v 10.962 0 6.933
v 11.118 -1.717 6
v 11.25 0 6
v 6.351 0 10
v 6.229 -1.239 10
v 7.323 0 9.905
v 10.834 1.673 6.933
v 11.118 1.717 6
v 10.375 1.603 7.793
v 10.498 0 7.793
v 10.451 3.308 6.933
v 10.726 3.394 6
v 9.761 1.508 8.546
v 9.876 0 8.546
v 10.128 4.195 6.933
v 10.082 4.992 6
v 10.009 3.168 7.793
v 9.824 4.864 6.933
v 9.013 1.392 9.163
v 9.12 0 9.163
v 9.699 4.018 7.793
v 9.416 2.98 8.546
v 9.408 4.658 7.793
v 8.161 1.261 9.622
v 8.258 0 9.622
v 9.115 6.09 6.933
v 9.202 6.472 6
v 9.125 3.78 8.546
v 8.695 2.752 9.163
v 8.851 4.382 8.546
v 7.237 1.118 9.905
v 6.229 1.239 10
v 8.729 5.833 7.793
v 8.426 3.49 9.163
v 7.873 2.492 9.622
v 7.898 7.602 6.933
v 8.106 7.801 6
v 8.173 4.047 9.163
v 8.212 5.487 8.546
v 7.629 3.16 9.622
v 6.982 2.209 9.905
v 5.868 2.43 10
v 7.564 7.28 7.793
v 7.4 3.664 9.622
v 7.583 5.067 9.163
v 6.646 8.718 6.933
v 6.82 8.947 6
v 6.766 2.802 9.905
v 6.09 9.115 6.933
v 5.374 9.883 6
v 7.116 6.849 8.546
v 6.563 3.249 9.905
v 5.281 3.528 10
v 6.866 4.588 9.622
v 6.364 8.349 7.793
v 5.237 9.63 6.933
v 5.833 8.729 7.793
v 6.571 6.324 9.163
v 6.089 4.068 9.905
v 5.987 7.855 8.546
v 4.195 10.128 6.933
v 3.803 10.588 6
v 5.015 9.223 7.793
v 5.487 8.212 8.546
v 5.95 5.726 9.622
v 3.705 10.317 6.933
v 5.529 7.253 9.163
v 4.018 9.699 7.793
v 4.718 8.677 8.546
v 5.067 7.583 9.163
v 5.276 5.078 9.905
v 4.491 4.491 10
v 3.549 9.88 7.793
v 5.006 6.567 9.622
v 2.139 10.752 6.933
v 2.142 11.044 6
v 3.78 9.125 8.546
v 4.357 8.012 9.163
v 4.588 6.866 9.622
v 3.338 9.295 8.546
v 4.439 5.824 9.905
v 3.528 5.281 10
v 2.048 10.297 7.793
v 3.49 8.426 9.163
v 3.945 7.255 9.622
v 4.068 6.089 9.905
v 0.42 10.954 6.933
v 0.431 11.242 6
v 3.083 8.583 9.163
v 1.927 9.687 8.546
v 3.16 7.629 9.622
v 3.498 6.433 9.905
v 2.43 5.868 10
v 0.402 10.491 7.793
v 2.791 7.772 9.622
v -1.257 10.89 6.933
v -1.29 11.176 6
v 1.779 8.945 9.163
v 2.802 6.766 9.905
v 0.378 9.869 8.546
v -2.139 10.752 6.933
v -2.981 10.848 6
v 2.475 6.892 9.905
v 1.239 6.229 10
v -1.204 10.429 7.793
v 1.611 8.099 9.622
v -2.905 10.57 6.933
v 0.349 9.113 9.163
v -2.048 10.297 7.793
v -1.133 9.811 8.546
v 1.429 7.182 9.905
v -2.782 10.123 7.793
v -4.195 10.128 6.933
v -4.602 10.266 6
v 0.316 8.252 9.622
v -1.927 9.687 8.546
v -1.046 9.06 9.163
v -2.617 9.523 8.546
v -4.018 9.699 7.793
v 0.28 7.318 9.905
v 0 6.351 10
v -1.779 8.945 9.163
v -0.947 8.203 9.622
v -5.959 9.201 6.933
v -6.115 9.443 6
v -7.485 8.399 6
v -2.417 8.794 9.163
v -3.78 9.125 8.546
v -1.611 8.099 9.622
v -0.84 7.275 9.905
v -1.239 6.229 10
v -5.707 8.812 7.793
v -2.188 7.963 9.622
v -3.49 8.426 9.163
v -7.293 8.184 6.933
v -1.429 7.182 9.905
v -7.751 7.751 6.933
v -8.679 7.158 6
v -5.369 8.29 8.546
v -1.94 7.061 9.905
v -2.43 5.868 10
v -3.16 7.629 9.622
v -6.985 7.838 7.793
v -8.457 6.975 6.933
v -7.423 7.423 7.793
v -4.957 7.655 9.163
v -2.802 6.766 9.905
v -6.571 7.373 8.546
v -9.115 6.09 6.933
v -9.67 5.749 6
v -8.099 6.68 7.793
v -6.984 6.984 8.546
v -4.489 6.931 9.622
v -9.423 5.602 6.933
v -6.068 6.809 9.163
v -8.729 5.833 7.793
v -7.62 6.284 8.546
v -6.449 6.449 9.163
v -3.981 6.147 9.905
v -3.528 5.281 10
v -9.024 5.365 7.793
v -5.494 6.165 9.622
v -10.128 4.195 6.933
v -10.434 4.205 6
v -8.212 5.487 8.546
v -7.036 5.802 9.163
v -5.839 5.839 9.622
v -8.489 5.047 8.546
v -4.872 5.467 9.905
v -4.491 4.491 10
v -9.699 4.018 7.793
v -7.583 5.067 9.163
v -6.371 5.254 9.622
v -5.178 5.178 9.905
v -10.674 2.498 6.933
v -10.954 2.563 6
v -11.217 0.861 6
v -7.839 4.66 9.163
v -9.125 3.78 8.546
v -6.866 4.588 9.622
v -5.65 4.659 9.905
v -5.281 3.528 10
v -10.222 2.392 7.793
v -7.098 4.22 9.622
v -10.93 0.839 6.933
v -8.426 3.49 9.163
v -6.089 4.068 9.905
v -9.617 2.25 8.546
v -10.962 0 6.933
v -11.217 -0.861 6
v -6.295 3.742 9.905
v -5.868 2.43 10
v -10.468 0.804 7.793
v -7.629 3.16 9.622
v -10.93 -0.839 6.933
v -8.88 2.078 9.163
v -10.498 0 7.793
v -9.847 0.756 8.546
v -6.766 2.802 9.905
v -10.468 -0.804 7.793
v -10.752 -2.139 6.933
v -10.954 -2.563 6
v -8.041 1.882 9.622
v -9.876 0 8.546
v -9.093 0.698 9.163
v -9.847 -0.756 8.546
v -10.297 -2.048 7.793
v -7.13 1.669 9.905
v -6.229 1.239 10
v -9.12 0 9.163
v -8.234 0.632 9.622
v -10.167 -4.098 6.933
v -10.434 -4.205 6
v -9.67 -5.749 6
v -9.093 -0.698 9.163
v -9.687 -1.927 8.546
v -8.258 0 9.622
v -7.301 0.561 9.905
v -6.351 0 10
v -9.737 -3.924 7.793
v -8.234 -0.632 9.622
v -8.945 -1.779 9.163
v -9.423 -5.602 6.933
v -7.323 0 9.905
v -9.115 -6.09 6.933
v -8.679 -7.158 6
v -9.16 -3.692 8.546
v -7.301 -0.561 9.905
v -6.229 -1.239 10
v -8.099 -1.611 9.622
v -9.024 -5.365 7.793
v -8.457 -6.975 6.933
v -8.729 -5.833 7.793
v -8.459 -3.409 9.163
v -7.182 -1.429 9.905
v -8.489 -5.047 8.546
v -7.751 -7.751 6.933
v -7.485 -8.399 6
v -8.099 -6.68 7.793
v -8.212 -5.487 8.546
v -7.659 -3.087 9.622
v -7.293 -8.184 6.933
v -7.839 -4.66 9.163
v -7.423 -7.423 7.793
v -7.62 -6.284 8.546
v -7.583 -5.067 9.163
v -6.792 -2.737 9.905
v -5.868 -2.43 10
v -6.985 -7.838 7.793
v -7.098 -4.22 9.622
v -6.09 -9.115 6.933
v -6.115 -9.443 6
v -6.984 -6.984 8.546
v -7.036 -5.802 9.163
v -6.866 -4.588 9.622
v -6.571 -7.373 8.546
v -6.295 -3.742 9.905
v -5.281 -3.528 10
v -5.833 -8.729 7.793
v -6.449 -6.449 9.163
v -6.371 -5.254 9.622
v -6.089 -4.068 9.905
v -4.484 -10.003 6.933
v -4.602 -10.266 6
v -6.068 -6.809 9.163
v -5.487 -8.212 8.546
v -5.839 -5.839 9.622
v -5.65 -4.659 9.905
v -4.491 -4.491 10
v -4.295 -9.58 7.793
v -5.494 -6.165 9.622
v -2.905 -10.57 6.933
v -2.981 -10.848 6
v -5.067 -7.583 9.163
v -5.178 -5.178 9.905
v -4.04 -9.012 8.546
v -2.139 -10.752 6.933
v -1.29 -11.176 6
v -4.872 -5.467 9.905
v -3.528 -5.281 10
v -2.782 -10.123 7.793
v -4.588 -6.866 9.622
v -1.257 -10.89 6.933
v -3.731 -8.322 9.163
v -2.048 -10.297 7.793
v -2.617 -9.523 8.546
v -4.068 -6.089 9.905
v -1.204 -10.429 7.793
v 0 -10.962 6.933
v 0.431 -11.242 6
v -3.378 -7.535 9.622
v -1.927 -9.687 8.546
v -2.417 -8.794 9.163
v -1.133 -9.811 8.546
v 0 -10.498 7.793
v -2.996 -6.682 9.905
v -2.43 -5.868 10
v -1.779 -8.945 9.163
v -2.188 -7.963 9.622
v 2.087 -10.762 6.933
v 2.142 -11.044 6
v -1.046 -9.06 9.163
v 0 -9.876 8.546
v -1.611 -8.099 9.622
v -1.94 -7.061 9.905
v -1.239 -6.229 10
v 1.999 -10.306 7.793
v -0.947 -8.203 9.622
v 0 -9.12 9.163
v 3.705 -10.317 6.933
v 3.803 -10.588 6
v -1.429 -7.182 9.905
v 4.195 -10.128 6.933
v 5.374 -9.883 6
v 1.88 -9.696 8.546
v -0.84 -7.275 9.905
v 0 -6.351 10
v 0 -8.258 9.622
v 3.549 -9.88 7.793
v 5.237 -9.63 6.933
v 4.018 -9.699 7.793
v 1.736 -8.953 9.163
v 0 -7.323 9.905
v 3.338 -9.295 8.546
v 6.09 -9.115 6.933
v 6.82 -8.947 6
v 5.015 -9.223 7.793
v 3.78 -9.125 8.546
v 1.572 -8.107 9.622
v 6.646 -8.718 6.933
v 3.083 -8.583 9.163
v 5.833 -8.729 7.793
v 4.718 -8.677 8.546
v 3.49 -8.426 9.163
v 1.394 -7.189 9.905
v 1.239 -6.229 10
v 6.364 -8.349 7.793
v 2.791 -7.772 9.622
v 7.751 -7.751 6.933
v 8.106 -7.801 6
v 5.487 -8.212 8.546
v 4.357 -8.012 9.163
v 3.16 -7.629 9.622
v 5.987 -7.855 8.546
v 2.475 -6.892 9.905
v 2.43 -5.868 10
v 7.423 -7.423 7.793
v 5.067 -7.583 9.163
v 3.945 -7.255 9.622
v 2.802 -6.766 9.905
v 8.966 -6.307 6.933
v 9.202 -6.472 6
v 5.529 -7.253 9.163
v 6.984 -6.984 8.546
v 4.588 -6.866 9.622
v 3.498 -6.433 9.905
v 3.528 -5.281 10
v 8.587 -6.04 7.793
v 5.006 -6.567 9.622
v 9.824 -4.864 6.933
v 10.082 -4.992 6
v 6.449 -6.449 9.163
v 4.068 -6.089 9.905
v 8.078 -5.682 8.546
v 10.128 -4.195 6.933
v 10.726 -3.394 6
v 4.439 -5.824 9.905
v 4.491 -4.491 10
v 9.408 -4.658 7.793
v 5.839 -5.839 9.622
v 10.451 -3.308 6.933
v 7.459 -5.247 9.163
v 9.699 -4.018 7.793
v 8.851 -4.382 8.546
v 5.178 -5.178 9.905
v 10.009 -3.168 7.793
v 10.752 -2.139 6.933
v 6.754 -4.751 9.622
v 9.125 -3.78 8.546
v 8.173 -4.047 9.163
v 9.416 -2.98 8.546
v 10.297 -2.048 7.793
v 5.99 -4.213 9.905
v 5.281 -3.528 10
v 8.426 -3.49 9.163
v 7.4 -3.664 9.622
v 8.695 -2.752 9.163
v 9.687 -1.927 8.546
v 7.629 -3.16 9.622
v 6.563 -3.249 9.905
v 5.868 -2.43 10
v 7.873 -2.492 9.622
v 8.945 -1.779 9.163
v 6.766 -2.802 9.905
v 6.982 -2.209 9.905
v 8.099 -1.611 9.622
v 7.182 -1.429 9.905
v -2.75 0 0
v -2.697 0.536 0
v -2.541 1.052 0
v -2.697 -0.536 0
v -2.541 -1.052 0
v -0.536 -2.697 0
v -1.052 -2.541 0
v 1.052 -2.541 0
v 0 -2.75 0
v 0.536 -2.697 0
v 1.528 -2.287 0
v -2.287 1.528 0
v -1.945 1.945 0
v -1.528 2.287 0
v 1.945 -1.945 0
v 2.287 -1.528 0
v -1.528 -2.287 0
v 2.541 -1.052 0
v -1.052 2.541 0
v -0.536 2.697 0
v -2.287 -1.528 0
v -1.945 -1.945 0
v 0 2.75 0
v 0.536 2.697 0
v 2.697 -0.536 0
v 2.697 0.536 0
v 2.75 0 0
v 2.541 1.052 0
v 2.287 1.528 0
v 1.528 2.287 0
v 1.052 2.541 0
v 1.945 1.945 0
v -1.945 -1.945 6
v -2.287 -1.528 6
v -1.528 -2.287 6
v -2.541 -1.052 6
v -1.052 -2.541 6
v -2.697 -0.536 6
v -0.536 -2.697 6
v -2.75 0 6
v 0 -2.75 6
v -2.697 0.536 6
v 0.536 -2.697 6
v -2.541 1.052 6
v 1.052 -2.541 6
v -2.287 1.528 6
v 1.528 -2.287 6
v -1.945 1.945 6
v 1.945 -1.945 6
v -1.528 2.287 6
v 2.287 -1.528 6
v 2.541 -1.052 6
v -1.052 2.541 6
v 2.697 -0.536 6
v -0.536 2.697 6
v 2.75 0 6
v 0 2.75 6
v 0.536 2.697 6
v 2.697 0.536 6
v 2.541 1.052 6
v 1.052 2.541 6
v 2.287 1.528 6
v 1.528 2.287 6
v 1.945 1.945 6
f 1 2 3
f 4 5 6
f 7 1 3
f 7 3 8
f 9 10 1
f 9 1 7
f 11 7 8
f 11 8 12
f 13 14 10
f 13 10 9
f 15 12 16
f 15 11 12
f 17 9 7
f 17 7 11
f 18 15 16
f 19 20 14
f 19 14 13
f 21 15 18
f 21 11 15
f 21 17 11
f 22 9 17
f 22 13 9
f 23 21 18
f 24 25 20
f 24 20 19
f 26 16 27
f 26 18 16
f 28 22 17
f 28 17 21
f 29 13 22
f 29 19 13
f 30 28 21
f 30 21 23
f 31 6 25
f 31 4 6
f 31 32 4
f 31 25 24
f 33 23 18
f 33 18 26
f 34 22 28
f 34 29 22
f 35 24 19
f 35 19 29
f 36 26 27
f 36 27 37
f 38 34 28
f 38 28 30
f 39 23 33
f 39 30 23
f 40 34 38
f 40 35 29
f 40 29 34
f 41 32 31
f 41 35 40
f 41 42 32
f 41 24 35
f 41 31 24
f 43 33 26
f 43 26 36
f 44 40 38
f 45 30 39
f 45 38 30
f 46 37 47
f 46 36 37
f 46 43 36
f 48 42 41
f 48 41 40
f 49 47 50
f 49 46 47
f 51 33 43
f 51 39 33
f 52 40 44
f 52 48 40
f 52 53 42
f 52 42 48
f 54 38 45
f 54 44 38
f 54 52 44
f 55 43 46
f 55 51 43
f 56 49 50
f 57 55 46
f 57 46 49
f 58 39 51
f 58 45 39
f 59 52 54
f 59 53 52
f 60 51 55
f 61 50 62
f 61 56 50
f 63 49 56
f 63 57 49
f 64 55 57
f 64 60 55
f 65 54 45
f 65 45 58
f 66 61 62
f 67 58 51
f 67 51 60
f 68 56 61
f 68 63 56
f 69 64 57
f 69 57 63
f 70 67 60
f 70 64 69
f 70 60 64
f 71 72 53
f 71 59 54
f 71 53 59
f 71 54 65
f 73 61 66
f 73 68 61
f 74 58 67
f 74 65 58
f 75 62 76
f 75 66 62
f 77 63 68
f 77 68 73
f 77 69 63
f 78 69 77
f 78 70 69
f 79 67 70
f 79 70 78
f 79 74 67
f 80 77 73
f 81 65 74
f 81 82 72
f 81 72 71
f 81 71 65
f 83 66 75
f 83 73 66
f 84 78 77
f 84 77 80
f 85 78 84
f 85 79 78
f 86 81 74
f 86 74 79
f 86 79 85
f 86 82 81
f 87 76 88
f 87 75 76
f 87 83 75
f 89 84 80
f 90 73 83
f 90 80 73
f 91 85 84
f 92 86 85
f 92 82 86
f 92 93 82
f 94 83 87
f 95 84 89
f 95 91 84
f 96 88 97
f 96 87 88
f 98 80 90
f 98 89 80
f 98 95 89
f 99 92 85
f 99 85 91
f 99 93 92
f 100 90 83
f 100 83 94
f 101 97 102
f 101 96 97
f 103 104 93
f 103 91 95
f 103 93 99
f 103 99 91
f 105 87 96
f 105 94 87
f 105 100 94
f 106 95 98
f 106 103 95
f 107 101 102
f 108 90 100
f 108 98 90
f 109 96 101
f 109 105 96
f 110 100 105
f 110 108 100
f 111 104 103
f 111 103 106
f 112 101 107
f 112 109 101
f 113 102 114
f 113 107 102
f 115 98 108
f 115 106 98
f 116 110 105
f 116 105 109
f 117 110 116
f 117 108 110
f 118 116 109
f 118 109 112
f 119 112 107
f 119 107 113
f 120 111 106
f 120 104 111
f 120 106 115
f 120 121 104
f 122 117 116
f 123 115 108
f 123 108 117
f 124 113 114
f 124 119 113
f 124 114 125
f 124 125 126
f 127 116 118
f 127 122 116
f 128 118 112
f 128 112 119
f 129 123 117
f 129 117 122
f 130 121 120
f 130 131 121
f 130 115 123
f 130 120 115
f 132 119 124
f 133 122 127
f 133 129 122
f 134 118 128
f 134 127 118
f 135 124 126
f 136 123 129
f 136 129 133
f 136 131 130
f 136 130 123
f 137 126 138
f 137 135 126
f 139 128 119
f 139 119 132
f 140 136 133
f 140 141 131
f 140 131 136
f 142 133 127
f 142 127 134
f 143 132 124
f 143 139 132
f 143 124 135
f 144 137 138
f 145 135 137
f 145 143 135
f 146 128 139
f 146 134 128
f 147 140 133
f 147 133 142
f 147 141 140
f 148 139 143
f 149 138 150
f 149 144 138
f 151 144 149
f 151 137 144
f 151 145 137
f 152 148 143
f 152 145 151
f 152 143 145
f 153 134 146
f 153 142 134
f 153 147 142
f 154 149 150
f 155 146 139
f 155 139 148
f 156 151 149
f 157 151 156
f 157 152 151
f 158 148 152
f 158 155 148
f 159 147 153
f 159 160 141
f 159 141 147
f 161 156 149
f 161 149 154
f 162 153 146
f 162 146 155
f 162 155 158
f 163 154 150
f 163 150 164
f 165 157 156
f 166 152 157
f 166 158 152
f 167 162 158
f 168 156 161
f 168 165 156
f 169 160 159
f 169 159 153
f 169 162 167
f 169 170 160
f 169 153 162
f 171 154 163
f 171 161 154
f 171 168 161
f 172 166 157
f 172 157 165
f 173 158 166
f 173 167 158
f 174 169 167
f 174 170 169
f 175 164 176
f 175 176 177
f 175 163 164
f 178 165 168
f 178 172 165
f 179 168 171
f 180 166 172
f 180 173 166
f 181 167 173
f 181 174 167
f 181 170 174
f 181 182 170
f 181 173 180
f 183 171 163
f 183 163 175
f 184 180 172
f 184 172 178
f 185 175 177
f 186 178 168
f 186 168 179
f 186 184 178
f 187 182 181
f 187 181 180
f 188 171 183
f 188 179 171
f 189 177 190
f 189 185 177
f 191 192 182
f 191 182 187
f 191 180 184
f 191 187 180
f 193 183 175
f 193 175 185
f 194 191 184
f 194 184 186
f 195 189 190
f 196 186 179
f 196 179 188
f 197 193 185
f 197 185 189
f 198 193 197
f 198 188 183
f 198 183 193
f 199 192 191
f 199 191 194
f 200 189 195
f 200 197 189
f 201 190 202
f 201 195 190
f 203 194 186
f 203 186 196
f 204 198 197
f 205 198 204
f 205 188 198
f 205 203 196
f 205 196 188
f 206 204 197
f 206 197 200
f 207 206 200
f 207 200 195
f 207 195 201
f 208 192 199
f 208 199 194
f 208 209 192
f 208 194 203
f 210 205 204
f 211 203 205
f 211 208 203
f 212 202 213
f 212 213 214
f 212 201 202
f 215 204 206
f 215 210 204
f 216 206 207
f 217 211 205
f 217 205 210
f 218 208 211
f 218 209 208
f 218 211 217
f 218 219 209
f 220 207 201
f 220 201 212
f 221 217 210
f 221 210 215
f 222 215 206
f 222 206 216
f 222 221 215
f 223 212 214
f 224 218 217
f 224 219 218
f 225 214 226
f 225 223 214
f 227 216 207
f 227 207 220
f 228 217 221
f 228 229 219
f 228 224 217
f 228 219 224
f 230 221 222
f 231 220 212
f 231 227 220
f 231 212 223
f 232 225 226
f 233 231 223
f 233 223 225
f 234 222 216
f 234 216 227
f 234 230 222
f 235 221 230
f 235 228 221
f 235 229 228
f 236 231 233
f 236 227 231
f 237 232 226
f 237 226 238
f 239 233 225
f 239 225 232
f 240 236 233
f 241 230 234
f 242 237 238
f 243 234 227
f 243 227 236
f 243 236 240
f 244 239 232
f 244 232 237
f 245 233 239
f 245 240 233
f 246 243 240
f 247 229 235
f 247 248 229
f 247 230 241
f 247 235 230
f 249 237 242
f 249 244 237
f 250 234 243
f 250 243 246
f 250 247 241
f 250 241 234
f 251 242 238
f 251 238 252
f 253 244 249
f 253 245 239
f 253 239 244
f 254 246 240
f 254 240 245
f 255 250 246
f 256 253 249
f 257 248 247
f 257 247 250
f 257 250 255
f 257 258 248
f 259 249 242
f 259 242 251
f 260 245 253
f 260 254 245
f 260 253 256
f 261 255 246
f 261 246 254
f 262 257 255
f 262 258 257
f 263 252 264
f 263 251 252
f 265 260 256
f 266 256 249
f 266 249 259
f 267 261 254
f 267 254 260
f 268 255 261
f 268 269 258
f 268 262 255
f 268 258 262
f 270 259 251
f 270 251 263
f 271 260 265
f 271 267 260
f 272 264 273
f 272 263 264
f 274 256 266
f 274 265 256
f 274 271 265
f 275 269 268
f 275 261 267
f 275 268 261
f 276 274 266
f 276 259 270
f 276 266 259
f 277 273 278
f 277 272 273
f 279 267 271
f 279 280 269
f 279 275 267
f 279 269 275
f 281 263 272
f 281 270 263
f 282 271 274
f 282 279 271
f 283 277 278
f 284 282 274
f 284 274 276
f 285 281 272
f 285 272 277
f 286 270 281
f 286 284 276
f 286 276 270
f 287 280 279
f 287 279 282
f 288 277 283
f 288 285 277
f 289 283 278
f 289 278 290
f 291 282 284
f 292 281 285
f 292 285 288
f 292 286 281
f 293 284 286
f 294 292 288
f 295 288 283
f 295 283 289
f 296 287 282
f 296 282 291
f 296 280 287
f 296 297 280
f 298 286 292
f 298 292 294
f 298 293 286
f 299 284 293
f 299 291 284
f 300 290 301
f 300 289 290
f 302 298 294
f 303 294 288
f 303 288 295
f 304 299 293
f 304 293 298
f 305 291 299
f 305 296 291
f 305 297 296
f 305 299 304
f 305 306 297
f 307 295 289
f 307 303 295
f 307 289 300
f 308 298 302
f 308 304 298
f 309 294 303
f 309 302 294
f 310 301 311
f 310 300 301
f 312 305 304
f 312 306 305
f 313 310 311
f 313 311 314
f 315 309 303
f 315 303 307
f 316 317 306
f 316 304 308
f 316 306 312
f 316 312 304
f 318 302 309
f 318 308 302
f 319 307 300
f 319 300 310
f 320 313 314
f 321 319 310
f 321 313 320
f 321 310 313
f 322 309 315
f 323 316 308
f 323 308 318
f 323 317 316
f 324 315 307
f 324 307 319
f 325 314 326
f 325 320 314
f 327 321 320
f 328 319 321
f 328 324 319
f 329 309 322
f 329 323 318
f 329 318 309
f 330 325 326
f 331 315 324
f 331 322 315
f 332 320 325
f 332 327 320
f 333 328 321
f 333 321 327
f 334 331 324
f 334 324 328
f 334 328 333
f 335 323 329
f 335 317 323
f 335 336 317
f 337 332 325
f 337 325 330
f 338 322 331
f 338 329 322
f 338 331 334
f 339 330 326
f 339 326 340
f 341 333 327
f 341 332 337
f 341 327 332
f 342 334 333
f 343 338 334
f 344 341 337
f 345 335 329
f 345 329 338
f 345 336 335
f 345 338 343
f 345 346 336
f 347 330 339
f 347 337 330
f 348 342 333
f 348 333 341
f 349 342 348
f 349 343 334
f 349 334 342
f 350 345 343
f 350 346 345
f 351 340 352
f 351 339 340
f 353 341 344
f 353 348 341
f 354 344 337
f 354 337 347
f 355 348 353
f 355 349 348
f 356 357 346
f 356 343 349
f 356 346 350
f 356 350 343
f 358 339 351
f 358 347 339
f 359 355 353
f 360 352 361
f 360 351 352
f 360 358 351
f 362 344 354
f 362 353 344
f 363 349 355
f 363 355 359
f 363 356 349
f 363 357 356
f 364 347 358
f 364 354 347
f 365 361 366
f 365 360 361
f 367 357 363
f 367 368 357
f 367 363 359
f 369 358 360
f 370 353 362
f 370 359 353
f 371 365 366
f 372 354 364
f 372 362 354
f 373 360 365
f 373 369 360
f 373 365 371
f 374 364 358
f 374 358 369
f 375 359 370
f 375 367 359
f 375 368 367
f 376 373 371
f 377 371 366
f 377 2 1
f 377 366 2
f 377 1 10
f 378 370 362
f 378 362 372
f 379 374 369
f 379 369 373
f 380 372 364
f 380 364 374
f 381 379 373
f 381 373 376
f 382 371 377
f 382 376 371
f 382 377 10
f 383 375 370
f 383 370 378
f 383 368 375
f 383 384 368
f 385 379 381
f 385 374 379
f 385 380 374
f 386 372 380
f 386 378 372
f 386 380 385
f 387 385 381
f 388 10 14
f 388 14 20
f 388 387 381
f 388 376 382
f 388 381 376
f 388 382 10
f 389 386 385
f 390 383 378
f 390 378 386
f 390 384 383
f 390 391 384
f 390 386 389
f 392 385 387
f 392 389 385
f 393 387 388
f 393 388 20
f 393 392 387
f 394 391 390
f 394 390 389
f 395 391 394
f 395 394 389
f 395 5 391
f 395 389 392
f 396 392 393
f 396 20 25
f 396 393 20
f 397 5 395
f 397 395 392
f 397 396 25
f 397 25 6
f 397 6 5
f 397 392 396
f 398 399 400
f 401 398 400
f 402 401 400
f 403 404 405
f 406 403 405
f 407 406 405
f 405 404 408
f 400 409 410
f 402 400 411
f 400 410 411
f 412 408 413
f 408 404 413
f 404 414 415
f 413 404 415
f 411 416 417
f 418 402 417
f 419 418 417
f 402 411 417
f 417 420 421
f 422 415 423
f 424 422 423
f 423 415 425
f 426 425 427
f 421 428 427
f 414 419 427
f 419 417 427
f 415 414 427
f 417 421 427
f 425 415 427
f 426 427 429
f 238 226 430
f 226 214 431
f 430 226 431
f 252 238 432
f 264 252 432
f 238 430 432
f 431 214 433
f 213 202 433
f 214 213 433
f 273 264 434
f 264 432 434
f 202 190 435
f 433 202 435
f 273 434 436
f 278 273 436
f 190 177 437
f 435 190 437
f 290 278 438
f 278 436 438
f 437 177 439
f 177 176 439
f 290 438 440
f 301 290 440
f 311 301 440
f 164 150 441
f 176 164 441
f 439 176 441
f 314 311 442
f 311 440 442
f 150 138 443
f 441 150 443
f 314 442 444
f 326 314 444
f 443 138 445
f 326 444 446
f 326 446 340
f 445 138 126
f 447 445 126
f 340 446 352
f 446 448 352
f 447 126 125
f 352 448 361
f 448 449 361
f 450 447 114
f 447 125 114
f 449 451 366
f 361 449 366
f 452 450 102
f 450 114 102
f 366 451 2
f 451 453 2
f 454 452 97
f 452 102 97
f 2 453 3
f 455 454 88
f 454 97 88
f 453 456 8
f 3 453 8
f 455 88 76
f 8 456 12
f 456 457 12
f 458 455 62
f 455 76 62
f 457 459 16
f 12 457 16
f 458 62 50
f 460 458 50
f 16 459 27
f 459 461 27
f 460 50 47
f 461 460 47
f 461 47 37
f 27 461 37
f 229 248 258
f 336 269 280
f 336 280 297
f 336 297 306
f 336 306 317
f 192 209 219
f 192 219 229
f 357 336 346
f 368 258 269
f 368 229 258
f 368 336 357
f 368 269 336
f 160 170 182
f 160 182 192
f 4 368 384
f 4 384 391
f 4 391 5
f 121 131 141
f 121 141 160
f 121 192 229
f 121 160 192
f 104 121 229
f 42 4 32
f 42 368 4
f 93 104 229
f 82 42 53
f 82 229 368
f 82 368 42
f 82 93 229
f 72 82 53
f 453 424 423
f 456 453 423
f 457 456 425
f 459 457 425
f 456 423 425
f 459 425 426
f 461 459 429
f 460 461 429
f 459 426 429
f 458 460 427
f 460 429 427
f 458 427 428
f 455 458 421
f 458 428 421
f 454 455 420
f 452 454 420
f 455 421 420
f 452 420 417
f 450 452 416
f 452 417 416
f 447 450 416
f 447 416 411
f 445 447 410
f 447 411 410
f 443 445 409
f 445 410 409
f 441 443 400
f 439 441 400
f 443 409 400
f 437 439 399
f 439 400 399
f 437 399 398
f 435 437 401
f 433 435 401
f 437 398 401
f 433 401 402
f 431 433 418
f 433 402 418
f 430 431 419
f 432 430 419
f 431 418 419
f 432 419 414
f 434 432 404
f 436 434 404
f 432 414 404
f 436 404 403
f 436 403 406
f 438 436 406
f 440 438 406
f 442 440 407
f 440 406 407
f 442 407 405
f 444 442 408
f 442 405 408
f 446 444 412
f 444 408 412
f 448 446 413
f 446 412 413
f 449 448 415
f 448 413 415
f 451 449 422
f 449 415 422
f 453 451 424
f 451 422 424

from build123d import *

# Parameters (mm, degrees)
F0_R     = 2.75
F1_DEPTH = 6
F2_R     = 11.25
F3_DEPTH = 4


# Not quite as in the source:
# - a fillet or chamfer that OpenCascade refuses, or shapes differently, is made with other operations: its cross-section is extruded or revolved along the edge and cut away or added


with BuildPart() as f1:
    # F0 (on Top) → F1 (new body)
    with BuildSketch(Plane.XY):
        Circle(F0_R)
    extrude(amount=F1_DEPTH)

    # F2 (on face) → F3 (join)
    with BuildSketch(Plane.XY.offset(6)):
        Circle(F2_R)
    extrude(amount=F3_DEPTH)

    # F4: fillet of radius 5 on 1 edges, made by hand

    # F4_s1 → F4_t2 (revolve, cut)
    with BuildSketch(Plane.XZ):
        with BuildLine():
            ThreePointArc((11.25, 6), (9.5132981746, 8.8729833462), (6.3510205144, 10))
            Line((6.3510205144, 10), (11.25, 10))
            Line((11.25, 10), (11.25, 6))
        make_face()
    revolve(axis=Axis((0, 0, 10), (0, 0, 1)), mode=Mode.SUBTRACT)


solid = f1.part
